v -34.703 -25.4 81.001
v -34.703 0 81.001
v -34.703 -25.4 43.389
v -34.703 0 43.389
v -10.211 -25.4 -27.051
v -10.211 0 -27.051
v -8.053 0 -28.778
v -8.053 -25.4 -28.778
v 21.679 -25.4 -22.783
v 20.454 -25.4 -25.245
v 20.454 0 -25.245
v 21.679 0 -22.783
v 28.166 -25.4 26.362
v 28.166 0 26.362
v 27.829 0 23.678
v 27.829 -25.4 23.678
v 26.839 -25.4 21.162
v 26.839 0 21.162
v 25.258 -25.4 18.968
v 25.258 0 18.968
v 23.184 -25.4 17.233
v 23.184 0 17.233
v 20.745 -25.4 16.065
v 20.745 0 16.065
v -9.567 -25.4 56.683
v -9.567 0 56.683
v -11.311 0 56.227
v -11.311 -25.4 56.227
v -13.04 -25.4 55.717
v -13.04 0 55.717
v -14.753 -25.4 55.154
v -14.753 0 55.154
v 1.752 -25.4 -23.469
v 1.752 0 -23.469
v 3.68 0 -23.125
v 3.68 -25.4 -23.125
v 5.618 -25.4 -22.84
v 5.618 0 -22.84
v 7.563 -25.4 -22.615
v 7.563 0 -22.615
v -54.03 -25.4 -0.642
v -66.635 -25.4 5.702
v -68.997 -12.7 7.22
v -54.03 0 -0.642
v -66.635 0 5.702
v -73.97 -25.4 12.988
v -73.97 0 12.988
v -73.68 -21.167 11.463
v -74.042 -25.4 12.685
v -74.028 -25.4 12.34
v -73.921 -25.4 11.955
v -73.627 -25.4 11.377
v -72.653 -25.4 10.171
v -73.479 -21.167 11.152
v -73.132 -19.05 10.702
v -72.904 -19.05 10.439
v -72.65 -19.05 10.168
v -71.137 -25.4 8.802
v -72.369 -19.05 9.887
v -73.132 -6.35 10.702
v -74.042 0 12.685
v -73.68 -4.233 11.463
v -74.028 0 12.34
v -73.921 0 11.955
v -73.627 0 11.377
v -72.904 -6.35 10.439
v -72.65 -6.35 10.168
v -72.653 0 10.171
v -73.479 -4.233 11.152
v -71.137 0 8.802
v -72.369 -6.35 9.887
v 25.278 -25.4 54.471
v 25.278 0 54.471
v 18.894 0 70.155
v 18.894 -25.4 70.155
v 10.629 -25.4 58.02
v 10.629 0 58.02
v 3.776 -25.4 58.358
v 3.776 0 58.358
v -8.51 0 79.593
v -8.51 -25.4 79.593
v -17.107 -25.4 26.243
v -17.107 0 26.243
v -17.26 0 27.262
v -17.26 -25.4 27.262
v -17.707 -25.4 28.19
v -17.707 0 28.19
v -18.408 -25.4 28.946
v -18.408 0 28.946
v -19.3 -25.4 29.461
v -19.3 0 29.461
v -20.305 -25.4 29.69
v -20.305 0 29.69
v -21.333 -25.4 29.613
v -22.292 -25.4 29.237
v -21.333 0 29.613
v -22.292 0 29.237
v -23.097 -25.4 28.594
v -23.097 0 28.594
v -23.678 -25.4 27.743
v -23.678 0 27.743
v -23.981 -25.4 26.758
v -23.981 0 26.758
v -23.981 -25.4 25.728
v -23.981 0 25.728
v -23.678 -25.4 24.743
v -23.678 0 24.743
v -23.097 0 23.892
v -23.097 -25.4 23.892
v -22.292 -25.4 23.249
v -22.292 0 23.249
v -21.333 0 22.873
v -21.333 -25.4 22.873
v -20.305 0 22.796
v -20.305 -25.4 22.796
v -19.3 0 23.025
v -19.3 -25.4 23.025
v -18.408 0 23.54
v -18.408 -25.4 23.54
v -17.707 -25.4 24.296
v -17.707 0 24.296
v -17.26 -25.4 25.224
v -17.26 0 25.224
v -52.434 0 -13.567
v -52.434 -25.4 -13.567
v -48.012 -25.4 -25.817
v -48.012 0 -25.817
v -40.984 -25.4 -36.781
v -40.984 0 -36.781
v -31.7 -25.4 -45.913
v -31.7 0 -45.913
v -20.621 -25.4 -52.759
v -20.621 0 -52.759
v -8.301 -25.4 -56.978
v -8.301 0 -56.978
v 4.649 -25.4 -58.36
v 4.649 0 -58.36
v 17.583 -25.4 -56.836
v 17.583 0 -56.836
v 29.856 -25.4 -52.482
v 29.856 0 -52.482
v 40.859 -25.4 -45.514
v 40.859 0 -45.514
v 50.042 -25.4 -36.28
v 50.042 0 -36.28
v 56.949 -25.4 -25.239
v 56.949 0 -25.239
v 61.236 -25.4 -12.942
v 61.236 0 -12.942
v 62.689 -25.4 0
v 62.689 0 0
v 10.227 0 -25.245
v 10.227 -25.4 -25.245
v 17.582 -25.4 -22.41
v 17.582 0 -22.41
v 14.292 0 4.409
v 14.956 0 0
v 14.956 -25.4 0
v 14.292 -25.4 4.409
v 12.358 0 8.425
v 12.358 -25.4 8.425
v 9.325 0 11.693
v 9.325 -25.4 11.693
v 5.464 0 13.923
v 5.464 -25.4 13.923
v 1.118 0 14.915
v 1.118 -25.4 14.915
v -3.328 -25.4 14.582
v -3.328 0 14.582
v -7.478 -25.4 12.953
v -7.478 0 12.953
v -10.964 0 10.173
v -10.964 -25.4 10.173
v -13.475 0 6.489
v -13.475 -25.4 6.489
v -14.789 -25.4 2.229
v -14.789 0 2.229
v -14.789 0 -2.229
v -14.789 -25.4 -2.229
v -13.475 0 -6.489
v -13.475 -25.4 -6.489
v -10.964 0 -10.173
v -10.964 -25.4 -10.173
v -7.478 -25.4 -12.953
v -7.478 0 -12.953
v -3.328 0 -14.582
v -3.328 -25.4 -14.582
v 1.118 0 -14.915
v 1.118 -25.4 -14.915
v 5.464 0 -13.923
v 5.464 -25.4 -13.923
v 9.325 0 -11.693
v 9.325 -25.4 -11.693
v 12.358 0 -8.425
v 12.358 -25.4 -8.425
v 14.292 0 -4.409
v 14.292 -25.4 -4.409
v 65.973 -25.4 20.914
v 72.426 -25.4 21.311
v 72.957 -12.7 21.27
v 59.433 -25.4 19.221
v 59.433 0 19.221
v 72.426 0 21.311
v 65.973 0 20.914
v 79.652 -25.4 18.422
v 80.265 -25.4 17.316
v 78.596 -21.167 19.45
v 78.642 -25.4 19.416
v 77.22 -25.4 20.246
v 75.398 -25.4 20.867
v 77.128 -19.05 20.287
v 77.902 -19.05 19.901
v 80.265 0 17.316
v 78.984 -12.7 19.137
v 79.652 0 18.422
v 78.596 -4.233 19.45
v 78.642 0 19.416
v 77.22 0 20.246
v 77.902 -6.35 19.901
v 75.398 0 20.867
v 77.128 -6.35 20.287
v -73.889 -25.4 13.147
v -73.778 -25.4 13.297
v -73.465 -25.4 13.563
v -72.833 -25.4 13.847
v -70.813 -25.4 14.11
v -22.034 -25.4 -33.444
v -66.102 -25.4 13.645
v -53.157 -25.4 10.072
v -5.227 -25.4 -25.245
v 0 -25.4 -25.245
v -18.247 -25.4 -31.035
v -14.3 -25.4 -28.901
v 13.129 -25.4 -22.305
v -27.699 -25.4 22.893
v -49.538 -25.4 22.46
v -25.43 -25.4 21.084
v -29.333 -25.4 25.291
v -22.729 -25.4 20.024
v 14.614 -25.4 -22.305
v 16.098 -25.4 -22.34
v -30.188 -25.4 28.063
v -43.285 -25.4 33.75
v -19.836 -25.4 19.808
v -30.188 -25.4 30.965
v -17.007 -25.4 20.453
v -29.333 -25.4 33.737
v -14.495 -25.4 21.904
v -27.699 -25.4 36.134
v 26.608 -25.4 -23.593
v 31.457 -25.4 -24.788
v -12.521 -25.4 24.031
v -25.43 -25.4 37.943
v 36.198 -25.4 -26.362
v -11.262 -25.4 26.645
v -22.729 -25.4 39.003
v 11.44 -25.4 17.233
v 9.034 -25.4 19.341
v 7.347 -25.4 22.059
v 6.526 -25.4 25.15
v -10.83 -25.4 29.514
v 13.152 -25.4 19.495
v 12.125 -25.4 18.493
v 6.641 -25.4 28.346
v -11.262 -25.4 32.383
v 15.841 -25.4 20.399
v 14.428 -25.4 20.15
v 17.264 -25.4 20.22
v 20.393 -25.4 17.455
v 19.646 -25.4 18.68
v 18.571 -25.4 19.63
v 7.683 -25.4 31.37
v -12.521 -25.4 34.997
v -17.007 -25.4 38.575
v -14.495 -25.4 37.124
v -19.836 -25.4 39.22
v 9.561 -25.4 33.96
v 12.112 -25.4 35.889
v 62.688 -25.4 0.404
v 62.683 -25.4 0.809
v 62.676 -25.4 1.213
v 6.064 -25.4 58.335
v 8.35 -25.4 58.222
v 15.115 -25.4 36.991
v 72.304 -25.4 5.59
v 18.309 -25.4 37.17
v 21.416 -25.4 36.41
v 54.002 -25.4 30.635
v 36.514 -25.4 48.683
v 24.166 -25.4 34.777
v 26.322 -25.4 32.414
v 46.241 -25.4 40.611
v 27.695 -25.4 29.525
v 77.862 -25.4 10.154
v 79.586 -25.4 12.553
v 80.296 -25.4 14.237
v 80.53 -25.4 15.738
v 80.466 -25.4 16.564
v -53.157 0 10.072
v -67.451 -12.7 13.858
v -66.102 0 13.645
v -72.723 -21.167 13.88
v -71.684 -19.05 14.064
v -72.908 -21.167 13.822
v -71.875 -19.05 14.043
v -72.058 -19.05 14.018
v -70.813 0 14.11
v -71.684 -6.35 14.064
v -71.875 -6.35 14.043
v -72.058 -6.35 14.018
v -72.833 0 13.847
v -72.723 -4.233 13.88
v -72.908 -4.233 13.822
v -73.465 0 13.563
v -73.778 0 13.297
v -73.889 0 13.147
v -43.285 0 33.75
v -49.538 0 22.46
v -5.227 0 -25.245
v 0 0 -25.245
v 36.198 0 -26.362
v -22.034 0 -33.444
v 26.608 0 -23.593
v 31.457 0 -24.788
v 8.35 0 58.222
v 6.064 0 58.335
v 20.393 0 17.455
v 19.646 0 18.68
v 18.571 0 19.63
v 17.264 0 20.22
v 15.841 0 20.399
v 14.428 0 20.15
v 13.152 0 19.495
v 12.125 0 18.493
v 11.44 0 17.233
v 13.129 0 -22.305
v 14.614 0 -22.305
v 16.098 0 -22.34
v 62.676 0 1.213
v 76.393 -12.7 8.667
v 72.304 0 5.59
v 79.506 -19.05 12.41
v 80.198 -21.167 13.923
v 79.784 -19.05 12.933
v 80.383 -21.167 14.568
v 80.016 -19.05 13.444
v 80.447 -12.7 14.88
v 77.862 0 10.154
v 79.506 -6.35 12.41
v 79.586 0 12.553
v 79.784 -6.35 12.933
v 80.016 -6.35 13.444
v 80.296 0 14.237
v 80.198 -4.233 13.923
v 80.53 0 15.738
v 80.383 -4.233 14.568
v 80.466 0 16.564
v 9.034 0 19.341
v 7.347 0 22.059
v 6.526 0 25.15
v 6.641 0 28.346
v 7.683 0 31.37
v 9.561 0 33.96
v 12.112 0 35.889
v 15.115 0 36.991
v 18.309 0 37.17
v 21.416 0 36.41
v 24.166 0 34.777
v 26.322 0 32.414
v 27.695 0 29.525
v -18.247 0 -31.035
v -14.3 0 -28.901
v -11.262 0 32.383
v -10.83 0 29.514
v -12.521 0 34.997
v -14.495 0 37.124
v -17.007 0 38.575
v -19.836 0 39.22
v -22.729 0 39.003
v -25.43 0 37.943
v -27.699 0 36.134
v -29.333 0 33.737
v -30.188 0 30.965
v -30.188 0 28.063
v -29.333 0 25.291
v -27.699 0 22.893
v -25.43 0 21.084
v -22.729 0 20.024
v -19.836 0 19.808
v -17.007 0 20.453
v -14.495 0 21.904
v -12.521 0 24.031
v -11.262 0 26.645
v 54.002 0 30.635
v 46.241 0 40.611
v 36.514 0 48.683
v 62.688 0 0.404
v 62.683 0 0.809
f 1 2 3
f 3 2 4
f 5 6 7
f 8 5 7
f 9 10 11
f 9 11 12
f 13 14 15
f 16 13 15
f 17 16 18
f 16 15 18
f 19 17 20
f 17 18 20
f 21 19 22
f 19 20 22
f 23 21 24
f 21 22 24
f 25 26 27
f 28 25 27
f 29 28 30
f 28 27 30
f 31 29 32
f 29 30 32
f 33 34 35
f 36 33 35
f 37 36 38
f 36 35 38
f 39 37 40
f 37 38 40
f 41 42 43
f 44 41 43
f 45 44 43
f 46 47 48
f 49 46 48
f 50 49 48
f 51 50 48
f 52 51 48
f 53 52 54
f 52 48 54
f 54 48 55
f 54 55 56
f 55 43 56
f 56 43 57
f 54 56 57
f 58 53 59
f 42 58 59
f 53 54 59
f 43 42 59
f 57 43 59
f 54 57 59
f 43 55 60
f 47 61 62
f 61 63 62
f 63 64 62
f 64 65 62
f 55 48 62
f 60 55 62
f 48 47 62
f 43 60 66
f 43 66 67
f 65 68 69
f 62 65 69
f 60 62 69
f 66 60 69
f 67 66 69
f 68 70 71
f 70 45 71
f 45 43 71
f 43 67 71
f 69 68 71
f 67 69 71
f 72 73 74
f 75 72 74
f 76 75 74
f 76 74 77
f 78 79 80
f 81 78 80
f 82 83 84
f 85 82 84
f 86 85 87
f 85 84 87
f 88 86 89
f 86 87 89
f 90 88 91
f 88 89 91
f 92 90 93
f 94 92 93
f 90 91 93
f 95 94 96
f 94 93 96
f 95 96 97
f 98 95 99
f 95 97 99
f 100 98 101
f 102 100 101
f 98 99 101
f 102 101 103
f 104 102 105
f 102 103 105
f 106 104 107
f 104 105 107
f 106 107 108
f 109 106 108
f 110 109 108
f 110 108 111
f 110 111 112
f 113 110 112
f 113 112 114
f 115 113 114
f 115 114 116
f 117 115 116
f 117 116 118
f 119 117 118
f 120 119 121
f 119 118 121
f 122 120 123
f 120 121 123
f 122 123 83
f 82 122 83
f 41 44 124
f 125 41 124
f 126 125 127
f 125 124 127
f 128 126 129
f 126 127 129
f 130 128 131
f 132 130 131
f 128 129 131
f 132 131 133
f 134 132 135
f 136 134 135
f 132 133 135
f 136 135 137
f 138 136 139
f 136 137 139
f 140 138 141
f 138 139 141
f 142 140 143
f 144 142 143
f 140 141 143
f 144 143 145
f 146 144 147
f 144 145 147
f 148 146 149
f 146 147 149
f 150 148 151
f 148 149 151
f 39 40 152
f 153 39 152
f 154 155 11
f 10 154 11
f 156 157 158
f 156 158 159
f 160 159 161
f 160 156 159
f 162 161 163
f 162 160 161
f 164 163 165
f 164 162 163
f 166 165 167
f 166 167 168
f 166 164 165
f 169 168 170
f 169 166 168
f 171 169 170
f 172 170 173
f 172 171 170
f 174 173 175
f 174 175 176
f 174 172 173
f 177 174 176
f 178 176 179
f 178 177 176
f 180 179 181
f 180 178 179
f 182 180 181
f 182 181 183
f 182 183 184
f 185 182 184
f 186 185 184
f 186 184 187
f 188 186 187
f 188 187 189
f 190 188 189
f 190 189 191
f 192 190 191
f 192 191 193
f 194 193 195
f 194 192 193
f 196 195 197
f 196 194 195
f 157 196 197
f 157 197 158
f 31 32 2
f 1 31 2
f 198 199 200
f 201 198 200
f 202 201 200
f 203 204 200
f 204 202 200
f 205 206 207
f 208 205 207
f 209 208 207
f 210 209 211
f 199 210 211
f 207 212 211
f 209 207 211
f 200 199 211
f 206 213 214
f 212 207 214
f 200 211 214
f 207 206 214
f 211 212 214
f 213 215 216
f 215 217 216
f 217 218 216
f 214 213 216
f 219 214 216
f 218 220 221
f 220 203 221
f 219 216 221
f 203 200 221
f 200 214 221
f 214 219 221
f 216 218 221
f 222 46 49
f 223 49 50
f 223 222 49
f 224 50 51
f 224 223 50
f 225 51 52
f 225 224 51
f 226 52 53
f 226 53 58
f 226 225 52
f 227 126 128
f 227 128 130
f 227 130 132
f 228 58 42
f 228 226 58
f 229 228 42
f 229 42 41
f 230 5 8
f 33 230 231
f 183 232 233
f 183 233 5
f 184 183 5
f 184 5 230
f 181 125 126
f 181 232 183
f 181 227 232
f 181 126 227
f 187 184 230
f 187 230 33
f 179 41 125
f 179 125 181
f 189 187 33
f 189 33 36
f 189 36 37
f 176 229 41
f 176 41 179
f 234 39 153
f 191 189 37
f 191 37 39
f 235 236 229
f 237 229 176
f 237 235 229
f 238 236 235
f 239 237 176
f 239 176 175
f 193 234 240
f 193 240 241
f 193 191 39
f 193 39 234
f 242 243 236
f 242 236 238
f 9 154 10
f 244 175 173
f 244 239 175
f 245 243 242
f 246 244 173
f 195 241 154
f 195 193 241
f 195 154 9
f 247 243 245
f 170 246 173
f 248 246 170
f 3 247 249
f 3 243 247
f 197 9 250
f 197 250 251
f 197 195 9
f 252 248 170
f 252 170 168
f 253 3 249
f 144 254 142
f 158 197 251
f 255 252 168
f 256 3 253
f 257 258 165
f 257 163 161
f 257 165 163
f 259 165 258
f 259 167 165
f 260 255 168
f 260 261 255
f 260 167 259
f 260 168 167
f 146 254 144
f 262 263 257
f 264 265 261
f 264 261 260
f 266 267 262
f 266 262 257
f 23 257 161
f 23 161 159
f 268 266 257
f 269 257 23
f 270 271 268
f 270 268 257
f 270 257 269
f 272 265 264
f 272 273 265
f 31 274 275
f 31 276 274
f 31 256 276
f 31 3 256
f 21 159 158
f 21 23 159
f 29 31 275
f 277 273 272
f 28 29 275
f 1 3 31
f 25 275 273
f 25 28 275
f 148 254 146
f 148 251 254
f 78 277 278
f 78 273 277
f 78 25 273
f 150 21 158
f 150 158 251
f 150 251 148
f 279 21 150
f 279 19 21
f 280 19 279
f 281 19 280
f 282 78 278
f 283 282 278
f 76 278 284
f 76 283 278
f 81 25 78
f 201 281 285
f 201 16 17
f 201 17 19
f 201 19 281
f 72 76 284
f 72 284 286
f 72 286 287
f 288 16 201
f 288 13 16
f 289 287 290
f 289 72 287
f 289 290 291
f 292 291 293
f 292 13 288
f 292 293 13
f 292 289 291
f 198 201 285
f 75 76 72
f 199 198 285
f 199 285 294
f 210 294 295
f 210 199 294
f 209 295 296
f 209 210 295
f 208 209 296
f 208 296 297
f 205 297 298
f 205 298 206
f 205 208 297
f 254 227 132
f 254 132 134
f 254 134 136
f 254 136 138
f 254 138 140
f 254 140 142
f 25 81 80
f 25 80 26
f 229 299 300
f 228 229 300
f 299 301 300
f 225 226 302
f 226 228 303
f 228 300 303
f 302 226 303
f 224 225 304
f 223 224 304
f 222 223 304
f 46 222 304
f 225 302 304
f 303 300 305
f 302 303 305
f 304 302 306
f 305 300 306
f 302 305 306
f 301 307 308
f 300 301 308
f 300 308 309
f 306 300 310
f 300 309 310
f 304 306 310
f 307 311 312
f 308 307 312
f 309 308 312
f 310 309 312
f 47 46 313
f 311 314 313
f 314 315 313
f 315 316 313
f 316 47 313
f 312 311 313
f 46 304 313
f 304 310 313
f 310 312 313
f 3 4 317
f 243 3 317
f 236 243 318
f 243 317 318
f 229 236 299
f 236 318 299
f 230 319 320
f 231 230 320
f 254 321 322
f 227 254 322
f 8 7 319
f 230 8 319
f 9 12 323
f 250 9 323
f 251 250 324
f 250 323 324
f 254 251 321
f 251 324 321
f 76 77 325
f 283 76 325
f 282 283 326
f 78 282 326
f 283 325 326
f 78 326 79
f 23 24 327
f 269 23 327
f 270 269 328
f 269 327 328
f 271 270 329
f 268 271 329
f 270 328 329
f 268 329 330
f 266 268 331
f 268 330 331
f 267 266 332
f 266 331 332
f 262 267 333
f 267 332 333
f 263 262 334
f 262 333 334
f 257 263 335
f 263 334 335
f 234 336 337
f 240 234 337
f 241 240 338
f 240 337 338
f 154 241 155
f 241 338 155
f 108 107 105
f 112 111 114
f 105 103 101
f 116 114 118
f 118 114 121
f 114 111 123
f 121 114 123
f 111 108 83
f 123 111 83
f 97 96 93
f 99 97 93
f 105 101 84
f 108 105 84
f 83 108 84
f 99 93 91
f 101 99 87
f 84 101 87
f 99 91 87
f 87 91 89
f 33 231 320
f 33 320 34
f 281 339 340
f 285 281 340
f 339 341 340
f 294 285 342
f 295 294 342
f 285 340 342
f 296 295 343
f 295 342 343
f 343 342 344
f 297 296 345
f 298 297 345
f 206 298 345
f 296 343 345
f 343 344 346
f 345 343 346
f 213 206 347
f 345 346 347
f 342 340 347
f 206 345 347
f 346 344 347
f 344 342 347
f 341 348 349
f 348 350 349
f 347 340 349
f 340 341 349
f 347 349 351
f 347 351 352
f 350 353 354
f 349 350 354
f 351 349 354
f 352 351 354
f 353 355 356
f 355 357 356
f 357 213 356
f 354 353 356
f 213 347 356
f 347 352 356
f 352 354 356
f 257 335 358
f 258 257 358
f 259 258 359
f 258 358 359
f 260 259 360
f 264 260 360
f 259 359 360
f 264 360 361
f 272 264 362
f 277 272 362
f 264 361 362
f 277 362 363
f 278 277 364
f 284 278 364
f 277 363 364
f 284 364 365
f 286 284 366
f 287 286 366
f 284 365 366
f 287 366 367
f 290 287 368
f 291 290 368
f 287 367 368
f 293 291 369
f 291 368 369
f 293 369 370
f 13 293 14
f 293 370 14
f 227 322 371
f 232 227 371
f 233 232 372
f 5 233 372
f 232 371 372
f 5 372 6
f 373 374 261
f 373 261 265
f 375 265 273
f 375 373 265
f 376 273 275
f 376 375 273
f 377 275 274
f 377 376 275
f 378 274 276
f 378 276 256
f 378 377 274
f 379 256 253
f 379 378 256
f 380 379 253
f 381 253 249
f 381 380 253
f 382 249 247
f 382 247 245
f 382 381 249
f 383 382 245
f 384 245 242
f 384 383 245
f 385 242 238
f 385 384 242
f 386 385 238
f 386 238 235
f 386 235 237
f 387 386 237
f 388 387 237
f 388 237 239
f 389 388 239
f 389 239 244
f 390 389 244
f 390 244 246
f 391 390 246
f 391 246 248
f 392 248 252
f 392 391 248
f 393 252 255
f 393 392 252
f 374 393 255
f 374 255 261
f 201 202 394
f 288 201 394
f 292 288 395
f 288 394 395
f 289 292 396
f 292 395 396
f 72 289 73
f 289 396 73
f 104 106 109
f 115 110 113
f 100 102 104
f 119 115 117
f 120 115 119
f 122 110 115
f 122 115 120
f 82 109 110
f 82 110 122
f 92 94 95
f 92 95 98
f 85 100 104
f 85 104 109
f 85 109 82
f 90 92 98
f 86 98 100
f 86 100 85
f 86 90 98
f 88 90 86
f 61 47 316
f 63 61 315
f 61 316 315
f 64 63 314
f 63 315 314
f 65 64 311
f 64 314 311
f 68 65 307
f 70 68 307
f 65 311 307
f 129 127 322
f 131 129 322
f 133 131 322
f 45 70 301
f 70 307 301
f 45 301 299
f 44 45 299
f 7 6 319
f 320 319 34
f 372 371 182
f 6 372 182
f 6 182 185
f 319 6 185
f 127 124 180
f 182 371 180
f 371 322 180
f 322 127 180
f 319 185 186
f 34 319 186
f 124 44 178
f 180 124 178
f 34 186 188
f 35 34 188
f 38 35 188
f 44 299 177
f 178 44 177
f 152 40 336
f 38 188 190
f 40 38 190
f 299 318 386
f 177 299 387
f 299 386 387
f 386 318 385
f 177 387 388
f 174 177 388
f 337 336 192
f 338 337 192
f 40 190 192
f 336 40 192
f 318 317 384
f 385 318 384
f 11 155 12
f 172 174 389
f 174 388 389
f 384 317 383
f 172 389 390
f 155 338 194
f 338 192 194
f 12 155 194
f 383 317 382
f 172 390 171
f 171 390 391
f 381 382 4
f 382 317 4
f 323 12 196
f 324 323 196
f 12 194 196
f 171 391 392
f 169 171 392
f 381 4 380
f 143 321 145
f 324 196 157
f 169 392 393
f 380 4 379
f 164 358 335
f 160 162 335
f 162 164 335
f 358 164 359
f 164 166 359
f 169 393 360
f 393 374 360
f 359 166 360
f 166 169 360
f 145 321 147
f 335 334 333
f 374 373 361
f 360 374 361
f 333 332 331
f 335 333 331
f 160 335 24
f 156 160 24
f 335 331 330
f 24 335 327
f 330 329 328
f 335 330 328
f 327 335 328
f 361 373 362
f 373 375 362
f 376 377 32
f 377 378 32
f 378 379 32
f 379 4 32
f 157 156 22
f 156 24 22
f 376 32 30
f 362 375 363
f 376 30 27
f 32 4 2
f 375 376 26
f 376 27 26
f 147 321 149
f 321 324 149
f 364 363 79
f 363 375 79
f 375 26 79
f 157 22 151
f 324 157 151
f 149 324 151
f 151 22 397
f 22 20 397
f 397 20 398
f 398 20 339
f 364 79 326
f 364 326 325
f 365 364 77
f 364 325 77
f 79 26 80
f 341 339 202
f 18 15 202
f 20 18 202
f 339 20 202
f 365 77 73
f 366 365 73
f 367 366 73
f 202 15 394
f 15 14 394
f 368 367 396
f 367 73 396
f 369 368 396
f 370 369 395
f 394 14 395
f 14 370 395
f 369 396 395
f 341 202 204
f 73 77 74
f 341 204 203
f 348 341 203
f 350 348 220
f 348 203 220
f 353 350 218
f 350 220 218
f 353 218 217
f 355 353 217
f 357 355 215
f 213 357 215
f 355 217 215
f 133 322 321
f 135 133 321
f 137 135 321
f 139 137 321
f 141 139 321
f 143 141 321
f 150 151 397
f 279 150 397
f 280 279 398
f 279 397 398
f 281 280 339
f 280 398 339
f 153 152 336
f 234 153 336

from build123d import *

# Parameters (mm, degrees)
F0_R     = 14.9564951484
F0_R_2   = 9.7335574138
F1_DEPTH = 25.4
F0_R_3   = 3.456724349


# Not quite as in the source:
# - a feature names something its author has since deleted; it is built from what else it names
# - the program builds the solid bodies; features that only make, move or delete a surface that nothing else refers to are left out


with BuildPart() as f1:
    # F0 (on Front) → F1 (new body)
    with BuildSketch(Plane.XZ):
        with BuildLine():
            Line((29.2069212967, 44.8178982187), (-33.0534157144, 44.8178982187))
            ThreePointArc((-33.0534157144, 44.8178982187), (-33.8848589906, 44.1111281894), (-34.7029421619, 43.3889358876))
            ThreePointArc((-34.7029421619, 43.3889358876), (-46.7244943553, 28.2782026704), (-53.157396148, 10.0718919506))
            add(Edge.make_bspline(
                [(-54.0295326022, -0.6419861495), (-25.6291677814, -12.7776607333), (-25.1074200255, -6.368179936), (-24.5856722696, 0.0413008612), (-53.157396148, 10.0718919506)],
                knots=[1.4674967071, 1.4674967071, 1.4674967071, 3.2032565901, 3.2032565901, 4.9390164731, 4.9390164731, 4.9390164731], degree=2, weights=[1, 0.646445519, 1, 0.646445519, 1]))
            ThreePointArc((-54.0295326022, -0.6419861495), (4.6490094653, -58.3601924627), (62.6890867818, 0))
            ThreePointArc((62.6890867818, 0), (62.6859343797, 0.6065848839), (62.6764775138, 1.2131042379))
            add(Edge.make_bspline(
                [(59.4330403873, 19.2211055653), (41.4698148053, 12.9716188145), (43.0336953944, 4.2887424007), (44.5975759835, -4.3941340131), (62.6764775138, 1.2131042379)],
                knots=[1.5260344916, 1.5260344916, 1.5260344916, 3.0598387567, 3.0598387567, 4.5936430218, 4.5936430218, 4.5936430218], degree=2, weights=[1, 0.720063756, 1, 0.720063756, 1]))
            ThreePointArc((59.4330403873, 19.2211055653), (46.2413654037, 40.611400757), (25.2778493531, 54.4712713212))
            Line((25.2778493531, 54.4712713212), (29.2069212967, 44.8178982187))
        make_face()
        Circle(F0_R, mode=Mode.SUBTRACT)
        with BuildLine():
            ThreePointArc((21.6792569731, -22.7834417511), (29.0444233173, -24.1430496826), (36.1979231238, -26.361528784))
            Line((36.1979231238, -26.361528784), (-22.0335181803, -33.4437340498))
            ThreePointArc((-22.0335181803, -33.4437340498), (-16.2921483285, -29.9333256583), (-10.2111068854, -27.0510991203))
            Line((-10.2111068854, -27.0510991204), (-14.6030960605, -23.5375072807))
            Line((-14.6030960605, -23.5375072807), (5.047085695, -20.1314762235))
            Line((5.047085695, -20.1314762235), (24.1732671857, -17.7734531462))
            Line((24.1732671857, -17.7734531462), (21.6792569731, -22.7834417511))
        make_face(mode=Mode.SUBTRACT)
        with Locations((-20.5633433886, 29.5139586047)):
            Circle(F0_R_2, mode=Mode.SUBTRACT)
        with BuildLine():
            ThreePointArc((11.440167814, 17.2330375959), (12.1122768861, 35.8889061597), (28.1660100748, 26.361534372))
            ThreePointArc((28.1660100748, 26.361534372), (26.117377722, 20.0153029261), (20.7448195069, 16.0647122986))
            ThreePointArc((20.7448195069, 16.0647122986), (20.7622755027, 15.8287118822), (20.7680988698, 15.5921384334))
            ThreePointArc((20.7680988698, 15.5921384334), (15.1267587025, 10.8565590643), (11.440167814, 17.2330375959))
        make_face(mode=Mode.SUBTRACT)
        with BuildLine():
            ThreePointArc((-14.7525066988, 55.1538659378), (-24.3720908883, 50.8165251157), (-33.0534157144, 44.8178982187))
            Line((-33.0534157144, 44.8178982187), (29.2069212967, 44.8178982187))
            Line((29.2069212967, 44.8178982187), (25.2778493531, 54.4712713212))
            ThreePointArc((25.2778493531, 54.4712713212), (18.0685855983, 56.7204701), (10.6292413524, 58.0199069867))
            Line((10.6292413524, 58.0199069867), (7.0293885895, 52.7346457751))
            Line((7.0293885895, 52.7346457751), (3.7755604577, 58.3584604129))
            ThreePointArc((3.7755604577, 58.3584604129), (-2.9439825789, 57.9062449617), (-9.5666869161, 56.6829115246))
            Line((-9.5666869161, 56.6829115246), (-9.9255512055, 48.9001048884))
            Line((-9.9255512055, 48.9001048884), (-14.7525066988, 55.1538659378))
        make_face()
        with BuildLine():
            ThreePointArc((-34.7029421619, 43.3889358876), (-33.8848589906, 44.1111281894), (-33.0534157144, 44.8178982187))
            ThreePointArc((-33.0534157144, 44.8178982187), (-24.3720908883, 50.8165251157), (-14.7525066988, 55.1538659378))
            Line((-14.7525066988, 55.1538659378), (-34.7029421619, 81.0014745162))
            Line((-34.7029421619, 81.0014745162), (-34.7029421619, 43.3889358876))
        make_face()
        with BuildLine():
            add(Edge.make_bspline(
                [(80.264955759, 17.3160471022), (77.2571204557, 25.4221829679), (59.4330403873, 19.2211055653)],
                knots=[0, 0, 0, 1.5260344916, 1.5260344916, 1.5260344916], degree=2, weights=[1, 0.7227540692, 1]))
            ThreePointArc((59.4330403873, 19.2211055653), (61.7648977694, 10.3450086355), (62.6764775138, 1.2131042379))
            add(Edge.make_bspline(
                [(62.6764775138, 1.2131042379), (83.8081315933, 7.7671649955), (80.264955759, 17.3160471022)],
                knots=[4.5936430218, 4.5936430218, 4.5936430218, 6.2831853072, 6.2831853072, 6.2831853072], degree=2, weights=[1, 0.6639024438, 1]))
        make_face()
        with BuildLine():
            ThreePointArc((62.6764775138, 1.2131042379), (61.7648977694, 10.3450086355), (59.4330403873, 19.2211055653))
            add(Edge.make_bspline(
                [(59.4330403873, 19.2211055653), (41.4698148053, 12.9716188145), (43.0336953944, 4.2887424007), (44.5975759835, -4.3941340131), (62.6764775138, 1.2131042379)],
                knots=[1.5260344916, 1.5260344916, 1.5260344916, 3.0598387567, 3.0598387567, 4.5936430218, 4.5936430218, 4.5936430218], degree=2, weights=[1, 0.720063756, 1, 0.720063756, 1]))
        make_face()
        with BuildLine():
            add(Edge.make_bspline(
                [(-54.0295326022, -0.6419861495), (-25.6291677814, -12.7776607333), (-25.1074200255, -6.368179936), (-24.5856722696, 0.0413008612), (-53.157396148, 10.0718919506)],
                knots=[1.4674967071, 1.4674967071, 1.4674967071, 3.2032565901, 3.2032565901, 4.9390164731, 4.9390164731, 4.9390164731], degree=2, weights=[1, 0.646445519, 1, 0.646445519, 1]))
            ThreePointArc((-53.157396148, 10.0718919506), (-53.840658448, 4.7350751159), (-54.0295326022, -0.6419861495))
        make_face()
        with BuildLine():
            ThreePointArc((-54.0295326022, -0.6419861495), (-53.840658448, 4.7350751159), (-53.157396148, 10.0718919506))
            add(Edge.make_bspline(
                [(-53.157396148, 10.0718919506), (-72.4188899566, 16.8339679453), (-73.9696696401, 12.9880346358)],
                knots=[4.9390164731, 4.9390164731, 4.9390164731, 6.2831853072, 6.2831853072, 6.2831853072], degree=2, weights=[1, 0.7825255703, 1]))
            add(Edge.make_bspline(
                [(-73.9696696401, 12.9880346358), (-75.7271245891, 8.6295467082), (-54.0295326022, -0.6419861495)],
                knots=[0, 0, 0, 1.4674967071, 1.4674967071, 1.4674967071], degree=2, weights=[1, 0.7426695101, 1]))
        make_face()
        with BuildLine():
            Line((-8.5103068977, 79.5929687748), (-9.5666869161, 56.6829115246))
            ThreePointArc((-9.5666869161, 56.6829115246), (-2.9439825789, 57.9062449617), (3.7755604577, 58.3584604129))
            Line((3.7755604577, 58.3584604129), (-8.5103068977, 79.5929687748))
        make_face()
        with BuildLine():
            ThreePointArc((10.6292413524, 58.0199069867), (18.0685855983, 56.7204701), (25.2778493531, 54.4712713212))
            Line((25.2778493531, 54.4712713212), (18.8944284965, 70.1547569089))
            Line((18.8944284965, 70.1547569089), (10.6292413524, 58.0199069867))
        make_face()
        with BuildLine():
            ThreePointArc((17.581953772, -22.4095073895), (19.6336387932, -22.5632365329), (21.6792569731, -22.7834417511))
            Line((21.6792569731, -22.7834417511), (24.1732671857, -17.7734531462))
            Line((24.1732671857, -17.7734531462), (5.047085695, -20.1314762235))
            Line((5.047085695, -20.1314762235), (7.5632852876, -22.6151940263))
            ThreePointArc((7.5632852876, -22.6151940263), (10.3425062964, -22.398982827), (13.1285441555, -22.3051225785))
            Line((13.1285441555, -22.3051225785), (15.2741307635, -20.1314762235))
            Line((15.2741307635, -20.1314762235), (17.581953772, -22.4095073895))
        make_face()
        with BuildLine():
            Line((-14.6030960605, -23.5375072807), (-10.2111068854, -27.0510991204))
            ThreePointArc((-10.2111068854, -27.0510991203), (-7.7377628762, -26.0957196312), (-5.2266436009, -25.2445671531))
            ThreePointArc((-5.2266436009, -25.2445671531), (-1.7623985905, -24.2578232608), (1.7522839969, -23.4693669777))
            Line((1.7522839969, -23.4693669777), (5.047085695, -20.1314762235))
            Line((5.047085695, -20.1314762235), (-14.6030960605, -23.5375072807))
        make_face()
        with BuildLine():
            ThreePointArc((20.7448195069, 16.0647122986), (15.9598060497, 15.5921384334), (11.440167814, 17.2330375959))
            ThreePointArc((11.440167814, 17.2330375959), (15.1267587025, 10.8565590643), (20.7680988698, 15.5921384334))
            ThreePointArc((20.7680988698, 15.5921384334), (20.7622755027, 15.8287118822), (20.7448195069, 16.0647122986))
        make_face()
        with BuildLine():
            ThreePointArc((20.7448195069, 16.0647122986), (16.5588486209, 20.3629693716), (11.440167814, 17.2330375959))
            ThreePointArc((11.440167814, 17.2330375959), (15.9598060497, 15.5921384334), (20.7448195069, 16.0647122986))
        make_face()
        with BuildLine():
            ThreePointArc((-9.5666869161, 56.6829115246), (-12.1773125744, 55.9784724693), (-14.7525066988, 55.1538659378))
            Line((-14.7525066988, 55.1538659378), (-9.9255512055, 48.9001048884))
            Line((-9.9255512055, 48.9001048884), (-9.5666869161, 56.6829115246))
        make_face()
        with BuildLine():
            ThreePointArc((10.6292413524, 58.0199069867), (7.2073810591, 58.2900020166), (3.7755604577, 58.3584604129))
            Line((3.7755604577, 58.3584604129), (7.0293885895, 52.7346457751))
            Line((7.0293885895, 52.7346457751), (10.6292413524, 58.0199069867))
        make_face()
        with BuildLine():
            Line((7.5632852876, -22.6151940263), (5.047085695, -20.1314762235))
            Line((5.047085695, -20.1314762235), (1.7522839969, -23.4693669777))
            ThreePointArc((1.7522839969, -23.4693669777), (4.6478901063, -22.9749672477), (7.5632852876, -22.6151940263))
        make_face()
        with BuildLine():
            Line((10.2270450686, -25.2445671531), (13.1285441555, -22.3051225785))
            ThreePointArc((13.1285441555, -22.3051225785), (10.3425062964, -22.398982827), (7.5632852876, -22.6151940263))
            Line((7.5632852876, -22.6151940263), (10.2270450686, -25.2445671531))
        make_face()
        with BuildLine():
            ThreePointArc((-5.2266436009, -25.2445671531), (-7.7377628762, -26.0957196312), (-10.2111068854, -27.0510991203))
            Line((-10.2111068854, -27.0510991204), (-8.0530354753, -28.7775564939))
            Line((-8.0530354753, -28.7775564939), (-5.2266436009, -25.2445671531))
        make_face()
        with BuildLine():
            Line((20.4540901372, -25.2445671531), (21.6792569731, -22.7834417511))
            ThreePointArc((21.6792569731, -22.7834417511), (19.6336387932, -22.5632365329), (17.581953772, -22.4095073895))
            Line((17.581953772, -22.4095073895), (20.4540901372, -25.2445671531))
        make_face()
        with BuildLine():
            ThreePointArc((1.7522839969, -23.4693669777), (-1.7623985905, -24.2578232608), (-5.2266436009, -25.2445671531))
            Line((-5.2266436009, -25.2445671531), (0, -25.2445671531))
            Line((0, -25.2445671531), (1.7522839969, -23.4693669777))
        make_face()
        with BuildLine():
            ThreePointArc((13.1285441555, -22.3051225785), (15.356165832, -22.3181982774), (17.581953772, -22.4095073895))
            Line((17.581953772, -22.4095073895), (15.2741307635, -20.1314762235))
            Line((15.2741307635, -20.1314762235), (13.1285441555, -22.3051225785))
        make_face()
    extrude(amount=F1_DEPTH)


with BuildPart() as f1b:
    # F0 (on Front) → F1, piece 2 (new body)
    with BuildSketch(Plane.XZ):
        with Locations((-20.5633433886, 26.2429621071)):
            Circle(F0_R_3)
    extrude(amount=F1_DEPTH)


solid = Compound([f1.part, f1b.part])
